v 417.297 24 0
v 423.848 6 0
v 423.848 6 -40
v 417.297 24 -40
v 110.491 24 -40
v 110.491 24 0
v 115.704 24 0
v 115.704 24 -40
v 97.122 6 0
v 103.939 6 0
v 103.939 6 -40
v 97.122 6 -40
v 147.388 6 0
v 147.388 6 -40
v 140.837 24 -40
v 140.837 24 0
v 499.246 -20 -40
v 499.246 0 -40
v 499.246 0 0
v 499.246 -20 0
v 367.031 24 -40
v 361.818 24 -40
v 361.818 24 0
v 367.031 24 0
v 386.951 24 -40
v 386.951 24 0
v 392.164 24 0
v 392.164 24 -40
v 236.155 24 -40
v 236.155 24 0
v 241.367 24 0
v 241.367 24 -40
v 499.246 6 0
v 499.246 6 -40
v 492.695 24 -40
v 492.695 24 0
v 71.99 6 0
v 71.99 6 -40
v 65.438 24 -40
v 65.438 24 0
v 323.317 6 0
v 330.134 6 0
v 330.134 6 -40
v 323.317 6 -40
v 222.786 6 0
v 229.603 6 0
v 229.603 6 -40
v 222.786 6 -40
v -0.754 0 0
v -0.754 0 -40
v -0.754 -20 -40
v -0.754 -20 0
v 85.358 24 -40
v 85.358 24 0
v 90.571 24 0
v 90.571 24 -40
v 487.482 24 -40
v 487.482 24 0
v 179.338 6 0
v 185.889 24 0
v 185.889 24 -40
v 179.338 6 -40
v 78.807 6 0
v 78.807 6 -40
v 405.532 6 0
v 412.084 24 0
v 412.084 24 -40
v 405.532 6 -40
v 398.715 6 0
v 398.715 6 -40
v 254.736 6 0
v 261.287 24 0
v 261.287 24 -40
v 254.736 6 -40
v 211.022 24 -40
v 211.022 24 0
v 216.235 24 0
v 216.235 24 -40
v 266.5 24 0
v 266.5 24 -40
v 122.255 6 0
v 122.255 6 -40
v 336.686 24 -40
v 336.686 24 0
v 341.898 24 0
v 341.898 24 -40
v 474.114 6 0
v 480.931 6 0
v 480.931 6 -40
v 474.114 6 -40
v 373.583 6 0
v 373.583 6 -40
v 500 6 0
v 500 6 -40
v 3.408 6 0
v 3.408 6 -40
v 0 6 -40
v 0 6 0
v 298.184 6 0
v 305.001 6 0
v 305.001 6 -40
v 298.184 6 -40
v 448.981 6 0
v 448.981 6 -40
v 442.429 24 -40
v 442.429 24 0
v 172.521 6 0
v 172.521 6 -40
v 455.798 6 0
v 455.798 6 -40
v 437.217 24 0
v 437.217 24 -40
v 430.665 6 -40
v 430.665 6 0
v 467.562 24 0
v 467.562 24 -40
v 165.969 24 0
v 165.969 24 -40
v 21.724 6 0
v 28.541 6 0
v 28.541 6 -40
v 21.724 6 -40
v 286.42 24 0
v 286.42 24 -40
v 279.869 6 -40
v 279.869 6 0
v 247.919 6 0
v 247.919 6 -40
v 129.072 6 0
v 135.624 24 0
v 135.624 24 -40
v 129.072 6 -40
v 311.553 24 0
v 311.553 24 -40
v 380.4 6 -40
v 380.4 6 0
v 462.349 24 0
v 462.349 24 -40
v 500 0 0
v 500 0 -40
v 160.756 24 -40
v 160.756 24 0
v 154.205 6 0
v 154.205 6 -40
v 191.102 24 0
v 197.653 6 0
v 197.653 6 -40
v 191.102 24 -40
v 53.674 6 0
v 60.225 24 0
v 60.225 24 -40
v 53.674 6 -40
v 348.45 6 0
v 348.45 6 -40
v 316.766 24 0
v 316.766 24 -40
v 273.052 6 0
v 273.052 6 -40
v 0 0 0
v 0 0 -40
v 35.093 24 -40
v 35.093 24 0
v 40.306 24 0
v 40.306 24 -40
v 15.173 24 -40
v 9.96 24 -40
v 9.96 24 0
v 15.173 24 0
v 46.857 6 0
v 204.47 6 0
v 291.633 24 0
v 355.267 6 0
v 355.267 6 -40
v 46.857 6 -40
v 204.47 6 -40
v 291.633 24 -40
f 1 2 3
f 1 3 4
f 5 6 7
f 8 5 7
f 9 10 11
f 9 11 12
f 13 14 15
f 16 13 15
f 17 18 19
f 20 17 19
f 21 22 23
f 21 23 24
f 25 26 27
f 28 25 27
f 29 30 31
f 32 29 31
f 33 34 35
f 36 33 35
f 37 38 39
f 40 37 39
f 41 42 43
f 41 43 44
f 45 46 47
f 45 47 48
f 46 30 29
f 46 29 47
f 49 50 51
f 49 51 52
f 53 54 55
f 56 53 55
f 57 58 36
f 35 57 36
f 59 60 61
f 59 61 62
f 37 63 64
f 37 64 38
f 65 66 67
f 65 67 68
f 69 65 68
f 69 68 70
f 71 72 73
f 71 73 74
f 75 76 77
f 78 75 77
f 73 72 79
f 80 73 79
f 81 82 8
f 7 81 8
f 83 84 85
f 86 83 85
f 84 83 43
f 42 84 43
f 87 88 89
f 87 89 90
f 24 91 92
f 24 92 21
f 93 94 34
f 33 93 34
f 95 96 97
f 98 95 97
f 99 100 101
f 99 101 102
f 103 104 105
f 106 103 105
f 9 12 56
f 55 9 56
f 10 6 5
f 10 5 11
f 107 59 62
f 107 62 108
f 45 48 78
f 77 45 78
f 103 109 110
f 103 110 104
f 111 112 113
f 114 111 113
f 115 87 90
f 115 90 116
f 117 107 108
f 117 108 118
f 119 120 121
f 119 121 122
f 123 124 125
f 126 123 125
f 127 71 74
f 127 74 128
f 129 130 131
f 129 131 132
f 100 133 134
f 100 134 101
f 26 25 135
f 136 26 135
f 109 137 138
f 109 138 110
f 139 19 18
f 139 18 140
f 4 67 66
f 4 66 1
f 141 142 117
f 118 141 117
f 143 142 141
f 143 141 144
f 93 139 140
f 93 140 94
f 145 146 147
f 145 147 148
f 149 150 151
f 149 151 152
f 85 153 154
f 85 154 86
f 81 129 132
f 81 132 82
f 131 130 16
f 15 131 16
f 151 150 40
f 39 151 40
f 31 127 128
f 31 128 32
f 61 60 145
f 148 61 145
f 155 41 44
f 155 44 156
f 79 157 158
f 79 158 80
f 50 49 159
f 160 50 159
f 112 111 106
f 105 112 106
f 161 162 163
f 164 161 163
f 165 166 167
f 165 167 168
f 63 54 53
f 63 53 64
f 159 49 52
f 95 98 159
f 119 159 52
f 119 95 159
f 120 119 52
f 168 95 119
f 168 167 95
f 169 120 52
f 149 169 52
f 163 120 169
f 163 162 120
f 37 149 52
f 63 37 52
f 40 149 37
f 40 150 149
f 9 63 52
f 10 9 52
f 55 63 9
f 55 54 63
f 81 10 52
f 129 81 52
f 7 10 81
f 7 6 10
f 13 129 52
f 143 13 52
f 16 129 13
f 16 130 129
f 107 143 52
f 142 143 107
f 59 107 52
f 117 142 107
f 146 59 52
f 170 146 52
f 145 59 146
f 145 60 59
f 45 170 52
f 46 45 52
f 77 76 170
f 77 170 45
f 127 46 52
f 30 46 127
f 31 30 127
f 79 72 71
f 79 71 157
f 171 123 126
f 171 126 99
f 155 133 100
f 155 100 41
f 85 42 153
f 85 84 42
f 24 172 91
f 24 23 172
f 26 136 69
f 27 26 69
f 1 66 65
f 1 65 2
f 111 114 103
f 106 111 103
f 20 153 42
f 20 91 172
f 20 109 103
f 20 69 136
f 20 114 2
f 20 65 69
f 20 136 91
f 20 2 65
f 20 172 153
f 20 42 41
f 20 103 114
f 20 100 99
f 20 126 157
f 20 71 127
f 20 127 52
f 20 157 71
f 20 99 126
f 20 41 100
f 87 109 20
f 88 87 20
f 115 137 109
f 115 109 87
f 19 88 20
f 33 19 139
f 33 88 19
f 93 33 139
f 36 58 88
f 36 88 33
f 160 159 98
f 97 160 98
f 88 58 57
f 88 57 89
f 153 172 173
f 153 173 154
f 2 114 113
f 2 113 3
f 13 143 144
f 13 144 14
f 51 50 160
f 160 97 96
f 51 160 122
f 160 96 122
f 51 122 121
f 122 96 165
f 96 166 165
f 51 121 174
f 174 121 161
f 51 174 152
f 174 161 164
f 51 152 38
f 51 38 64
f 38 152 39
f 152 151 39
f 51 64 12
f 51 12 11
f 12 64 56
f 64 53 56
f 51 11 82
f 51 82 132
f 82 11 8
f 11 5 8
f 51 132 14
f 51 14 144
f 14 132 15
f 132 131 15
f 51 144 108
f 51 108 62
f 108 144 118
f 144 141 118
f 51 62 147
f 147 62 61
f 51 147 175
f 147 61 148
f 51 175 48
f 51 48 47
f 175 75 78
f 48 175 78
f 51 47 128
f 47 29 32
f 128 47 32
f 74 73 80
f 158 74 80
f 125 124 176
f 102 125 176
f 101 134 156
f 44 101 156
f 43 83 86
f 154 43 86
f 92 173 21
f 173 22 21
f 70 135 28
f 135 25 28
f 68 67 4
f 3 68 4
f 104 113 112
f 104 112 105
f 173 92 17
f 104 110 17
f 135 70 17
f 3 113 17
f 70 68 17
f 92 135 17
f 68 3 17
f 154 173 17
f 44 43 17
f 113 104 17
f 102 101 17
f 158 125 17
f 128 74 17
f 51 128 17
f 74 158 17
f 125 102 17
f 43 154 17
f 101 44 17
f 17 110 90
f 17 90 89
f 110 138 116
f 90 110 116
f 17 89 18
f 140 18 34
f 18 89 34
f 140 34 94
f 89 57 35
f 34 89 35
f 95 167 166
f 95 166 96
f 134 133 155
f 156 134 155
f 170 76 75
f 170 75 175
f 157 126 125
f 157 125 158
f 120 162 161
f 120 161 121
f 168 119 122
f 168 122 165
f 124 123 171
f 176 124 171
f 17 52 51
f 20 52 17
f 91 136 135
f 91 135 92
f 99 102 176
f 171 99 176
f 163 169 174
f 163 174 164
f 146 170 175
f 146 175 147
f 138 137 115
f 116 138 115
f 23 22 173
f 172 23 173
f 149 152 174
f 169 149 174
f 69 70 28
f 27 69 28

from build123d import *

# Parameters (mm, degrees)
BLANKSKE_W          = 500
BLANKSKE_H          = 24
BLANK_DEPTH         = 40
TOOTHCUTSIM_DEPTH   = 503.171285519
TEETHCUTS_COUNT     = 21
TEETHCUTS_PITCH     = 25.1327412
SKETCH1_W           = 800
SKETCH1_H           = 40
BOSS_EXTRUDE1_DEPTH = 30
SKETCH2_W           = 40
SKETCH2_H           = 30
CUT_EXTRUDE1_DEPTH  = 300
SKETCH3_W           = 500.753658957
SKETCH3_H           = 40
CUT_EXTRUDE3_DEPTH  = 10


with BuildPart() as part:
    # BlankSke → Blank (new body)
    with BuildSketch(Plane.XY):
        with Locations((250, 12)):
            Rectangle(BLANKSKE_W, BLANKSKE_H)
    extrude(amount=-BLANK_DEPTH)

    # TooCutSkeSim → ToothCutSim (cut, through all)
    with BuildSketch(Plane.XY):
        Polygon((3.408482957, 6), (-3.408482957, 6), (-9.969192018, 24.0254), (9.969192018, 24.0254), align=None)
    toothcutsim = extrude(amount=-TOOTHCUTSIM_DEPTH, mode=Mode.SUBTRACT)

    # TeethCuts: ToothCutSim ×21
    with Locations(*[(i * TEETHCUTS_PITCH, 0, 0) for i in range(1, TEETHCUTS_COUNT)]):
        add(toothcutsim, mode=Mode.SUBTRACT)

    # Sketch1 → Boss-Extrude1 (add)
    with BuildSketch(Plane.XZ):
        with Locations((99.246341043, -20)):
            Rectangle(SKETCH1_W, SKETCH1_H)
    extrude(amount=BOSS_EXTRUDE1_DEPTH)

    # Sketch2 → Cut-Extrude1 (cut)
    with BuildSketch(Plane.ZY.offset(300.753658957)):
        with Locations((-20, -15)):
            Rectangle(SKETCH2_W, SKETCH2_H)
    extrude(amount=-CUT_EXTRUDE1_DEPTH, mode=Mode.SUBTRACT)

    # Sketch3 → Cut-Extrude3 (cut)
    with BuildSketch(Plane.XZ.offset(30)):
        with Locations((249.623170522, -20)):
            Rectangle(SKETCH3_W, SKETCH3_H)
    extrude(amount=-CUT_EXTRUDE3_DEPTH, mode=Mode.SUBTRACT)


solid = part.part
